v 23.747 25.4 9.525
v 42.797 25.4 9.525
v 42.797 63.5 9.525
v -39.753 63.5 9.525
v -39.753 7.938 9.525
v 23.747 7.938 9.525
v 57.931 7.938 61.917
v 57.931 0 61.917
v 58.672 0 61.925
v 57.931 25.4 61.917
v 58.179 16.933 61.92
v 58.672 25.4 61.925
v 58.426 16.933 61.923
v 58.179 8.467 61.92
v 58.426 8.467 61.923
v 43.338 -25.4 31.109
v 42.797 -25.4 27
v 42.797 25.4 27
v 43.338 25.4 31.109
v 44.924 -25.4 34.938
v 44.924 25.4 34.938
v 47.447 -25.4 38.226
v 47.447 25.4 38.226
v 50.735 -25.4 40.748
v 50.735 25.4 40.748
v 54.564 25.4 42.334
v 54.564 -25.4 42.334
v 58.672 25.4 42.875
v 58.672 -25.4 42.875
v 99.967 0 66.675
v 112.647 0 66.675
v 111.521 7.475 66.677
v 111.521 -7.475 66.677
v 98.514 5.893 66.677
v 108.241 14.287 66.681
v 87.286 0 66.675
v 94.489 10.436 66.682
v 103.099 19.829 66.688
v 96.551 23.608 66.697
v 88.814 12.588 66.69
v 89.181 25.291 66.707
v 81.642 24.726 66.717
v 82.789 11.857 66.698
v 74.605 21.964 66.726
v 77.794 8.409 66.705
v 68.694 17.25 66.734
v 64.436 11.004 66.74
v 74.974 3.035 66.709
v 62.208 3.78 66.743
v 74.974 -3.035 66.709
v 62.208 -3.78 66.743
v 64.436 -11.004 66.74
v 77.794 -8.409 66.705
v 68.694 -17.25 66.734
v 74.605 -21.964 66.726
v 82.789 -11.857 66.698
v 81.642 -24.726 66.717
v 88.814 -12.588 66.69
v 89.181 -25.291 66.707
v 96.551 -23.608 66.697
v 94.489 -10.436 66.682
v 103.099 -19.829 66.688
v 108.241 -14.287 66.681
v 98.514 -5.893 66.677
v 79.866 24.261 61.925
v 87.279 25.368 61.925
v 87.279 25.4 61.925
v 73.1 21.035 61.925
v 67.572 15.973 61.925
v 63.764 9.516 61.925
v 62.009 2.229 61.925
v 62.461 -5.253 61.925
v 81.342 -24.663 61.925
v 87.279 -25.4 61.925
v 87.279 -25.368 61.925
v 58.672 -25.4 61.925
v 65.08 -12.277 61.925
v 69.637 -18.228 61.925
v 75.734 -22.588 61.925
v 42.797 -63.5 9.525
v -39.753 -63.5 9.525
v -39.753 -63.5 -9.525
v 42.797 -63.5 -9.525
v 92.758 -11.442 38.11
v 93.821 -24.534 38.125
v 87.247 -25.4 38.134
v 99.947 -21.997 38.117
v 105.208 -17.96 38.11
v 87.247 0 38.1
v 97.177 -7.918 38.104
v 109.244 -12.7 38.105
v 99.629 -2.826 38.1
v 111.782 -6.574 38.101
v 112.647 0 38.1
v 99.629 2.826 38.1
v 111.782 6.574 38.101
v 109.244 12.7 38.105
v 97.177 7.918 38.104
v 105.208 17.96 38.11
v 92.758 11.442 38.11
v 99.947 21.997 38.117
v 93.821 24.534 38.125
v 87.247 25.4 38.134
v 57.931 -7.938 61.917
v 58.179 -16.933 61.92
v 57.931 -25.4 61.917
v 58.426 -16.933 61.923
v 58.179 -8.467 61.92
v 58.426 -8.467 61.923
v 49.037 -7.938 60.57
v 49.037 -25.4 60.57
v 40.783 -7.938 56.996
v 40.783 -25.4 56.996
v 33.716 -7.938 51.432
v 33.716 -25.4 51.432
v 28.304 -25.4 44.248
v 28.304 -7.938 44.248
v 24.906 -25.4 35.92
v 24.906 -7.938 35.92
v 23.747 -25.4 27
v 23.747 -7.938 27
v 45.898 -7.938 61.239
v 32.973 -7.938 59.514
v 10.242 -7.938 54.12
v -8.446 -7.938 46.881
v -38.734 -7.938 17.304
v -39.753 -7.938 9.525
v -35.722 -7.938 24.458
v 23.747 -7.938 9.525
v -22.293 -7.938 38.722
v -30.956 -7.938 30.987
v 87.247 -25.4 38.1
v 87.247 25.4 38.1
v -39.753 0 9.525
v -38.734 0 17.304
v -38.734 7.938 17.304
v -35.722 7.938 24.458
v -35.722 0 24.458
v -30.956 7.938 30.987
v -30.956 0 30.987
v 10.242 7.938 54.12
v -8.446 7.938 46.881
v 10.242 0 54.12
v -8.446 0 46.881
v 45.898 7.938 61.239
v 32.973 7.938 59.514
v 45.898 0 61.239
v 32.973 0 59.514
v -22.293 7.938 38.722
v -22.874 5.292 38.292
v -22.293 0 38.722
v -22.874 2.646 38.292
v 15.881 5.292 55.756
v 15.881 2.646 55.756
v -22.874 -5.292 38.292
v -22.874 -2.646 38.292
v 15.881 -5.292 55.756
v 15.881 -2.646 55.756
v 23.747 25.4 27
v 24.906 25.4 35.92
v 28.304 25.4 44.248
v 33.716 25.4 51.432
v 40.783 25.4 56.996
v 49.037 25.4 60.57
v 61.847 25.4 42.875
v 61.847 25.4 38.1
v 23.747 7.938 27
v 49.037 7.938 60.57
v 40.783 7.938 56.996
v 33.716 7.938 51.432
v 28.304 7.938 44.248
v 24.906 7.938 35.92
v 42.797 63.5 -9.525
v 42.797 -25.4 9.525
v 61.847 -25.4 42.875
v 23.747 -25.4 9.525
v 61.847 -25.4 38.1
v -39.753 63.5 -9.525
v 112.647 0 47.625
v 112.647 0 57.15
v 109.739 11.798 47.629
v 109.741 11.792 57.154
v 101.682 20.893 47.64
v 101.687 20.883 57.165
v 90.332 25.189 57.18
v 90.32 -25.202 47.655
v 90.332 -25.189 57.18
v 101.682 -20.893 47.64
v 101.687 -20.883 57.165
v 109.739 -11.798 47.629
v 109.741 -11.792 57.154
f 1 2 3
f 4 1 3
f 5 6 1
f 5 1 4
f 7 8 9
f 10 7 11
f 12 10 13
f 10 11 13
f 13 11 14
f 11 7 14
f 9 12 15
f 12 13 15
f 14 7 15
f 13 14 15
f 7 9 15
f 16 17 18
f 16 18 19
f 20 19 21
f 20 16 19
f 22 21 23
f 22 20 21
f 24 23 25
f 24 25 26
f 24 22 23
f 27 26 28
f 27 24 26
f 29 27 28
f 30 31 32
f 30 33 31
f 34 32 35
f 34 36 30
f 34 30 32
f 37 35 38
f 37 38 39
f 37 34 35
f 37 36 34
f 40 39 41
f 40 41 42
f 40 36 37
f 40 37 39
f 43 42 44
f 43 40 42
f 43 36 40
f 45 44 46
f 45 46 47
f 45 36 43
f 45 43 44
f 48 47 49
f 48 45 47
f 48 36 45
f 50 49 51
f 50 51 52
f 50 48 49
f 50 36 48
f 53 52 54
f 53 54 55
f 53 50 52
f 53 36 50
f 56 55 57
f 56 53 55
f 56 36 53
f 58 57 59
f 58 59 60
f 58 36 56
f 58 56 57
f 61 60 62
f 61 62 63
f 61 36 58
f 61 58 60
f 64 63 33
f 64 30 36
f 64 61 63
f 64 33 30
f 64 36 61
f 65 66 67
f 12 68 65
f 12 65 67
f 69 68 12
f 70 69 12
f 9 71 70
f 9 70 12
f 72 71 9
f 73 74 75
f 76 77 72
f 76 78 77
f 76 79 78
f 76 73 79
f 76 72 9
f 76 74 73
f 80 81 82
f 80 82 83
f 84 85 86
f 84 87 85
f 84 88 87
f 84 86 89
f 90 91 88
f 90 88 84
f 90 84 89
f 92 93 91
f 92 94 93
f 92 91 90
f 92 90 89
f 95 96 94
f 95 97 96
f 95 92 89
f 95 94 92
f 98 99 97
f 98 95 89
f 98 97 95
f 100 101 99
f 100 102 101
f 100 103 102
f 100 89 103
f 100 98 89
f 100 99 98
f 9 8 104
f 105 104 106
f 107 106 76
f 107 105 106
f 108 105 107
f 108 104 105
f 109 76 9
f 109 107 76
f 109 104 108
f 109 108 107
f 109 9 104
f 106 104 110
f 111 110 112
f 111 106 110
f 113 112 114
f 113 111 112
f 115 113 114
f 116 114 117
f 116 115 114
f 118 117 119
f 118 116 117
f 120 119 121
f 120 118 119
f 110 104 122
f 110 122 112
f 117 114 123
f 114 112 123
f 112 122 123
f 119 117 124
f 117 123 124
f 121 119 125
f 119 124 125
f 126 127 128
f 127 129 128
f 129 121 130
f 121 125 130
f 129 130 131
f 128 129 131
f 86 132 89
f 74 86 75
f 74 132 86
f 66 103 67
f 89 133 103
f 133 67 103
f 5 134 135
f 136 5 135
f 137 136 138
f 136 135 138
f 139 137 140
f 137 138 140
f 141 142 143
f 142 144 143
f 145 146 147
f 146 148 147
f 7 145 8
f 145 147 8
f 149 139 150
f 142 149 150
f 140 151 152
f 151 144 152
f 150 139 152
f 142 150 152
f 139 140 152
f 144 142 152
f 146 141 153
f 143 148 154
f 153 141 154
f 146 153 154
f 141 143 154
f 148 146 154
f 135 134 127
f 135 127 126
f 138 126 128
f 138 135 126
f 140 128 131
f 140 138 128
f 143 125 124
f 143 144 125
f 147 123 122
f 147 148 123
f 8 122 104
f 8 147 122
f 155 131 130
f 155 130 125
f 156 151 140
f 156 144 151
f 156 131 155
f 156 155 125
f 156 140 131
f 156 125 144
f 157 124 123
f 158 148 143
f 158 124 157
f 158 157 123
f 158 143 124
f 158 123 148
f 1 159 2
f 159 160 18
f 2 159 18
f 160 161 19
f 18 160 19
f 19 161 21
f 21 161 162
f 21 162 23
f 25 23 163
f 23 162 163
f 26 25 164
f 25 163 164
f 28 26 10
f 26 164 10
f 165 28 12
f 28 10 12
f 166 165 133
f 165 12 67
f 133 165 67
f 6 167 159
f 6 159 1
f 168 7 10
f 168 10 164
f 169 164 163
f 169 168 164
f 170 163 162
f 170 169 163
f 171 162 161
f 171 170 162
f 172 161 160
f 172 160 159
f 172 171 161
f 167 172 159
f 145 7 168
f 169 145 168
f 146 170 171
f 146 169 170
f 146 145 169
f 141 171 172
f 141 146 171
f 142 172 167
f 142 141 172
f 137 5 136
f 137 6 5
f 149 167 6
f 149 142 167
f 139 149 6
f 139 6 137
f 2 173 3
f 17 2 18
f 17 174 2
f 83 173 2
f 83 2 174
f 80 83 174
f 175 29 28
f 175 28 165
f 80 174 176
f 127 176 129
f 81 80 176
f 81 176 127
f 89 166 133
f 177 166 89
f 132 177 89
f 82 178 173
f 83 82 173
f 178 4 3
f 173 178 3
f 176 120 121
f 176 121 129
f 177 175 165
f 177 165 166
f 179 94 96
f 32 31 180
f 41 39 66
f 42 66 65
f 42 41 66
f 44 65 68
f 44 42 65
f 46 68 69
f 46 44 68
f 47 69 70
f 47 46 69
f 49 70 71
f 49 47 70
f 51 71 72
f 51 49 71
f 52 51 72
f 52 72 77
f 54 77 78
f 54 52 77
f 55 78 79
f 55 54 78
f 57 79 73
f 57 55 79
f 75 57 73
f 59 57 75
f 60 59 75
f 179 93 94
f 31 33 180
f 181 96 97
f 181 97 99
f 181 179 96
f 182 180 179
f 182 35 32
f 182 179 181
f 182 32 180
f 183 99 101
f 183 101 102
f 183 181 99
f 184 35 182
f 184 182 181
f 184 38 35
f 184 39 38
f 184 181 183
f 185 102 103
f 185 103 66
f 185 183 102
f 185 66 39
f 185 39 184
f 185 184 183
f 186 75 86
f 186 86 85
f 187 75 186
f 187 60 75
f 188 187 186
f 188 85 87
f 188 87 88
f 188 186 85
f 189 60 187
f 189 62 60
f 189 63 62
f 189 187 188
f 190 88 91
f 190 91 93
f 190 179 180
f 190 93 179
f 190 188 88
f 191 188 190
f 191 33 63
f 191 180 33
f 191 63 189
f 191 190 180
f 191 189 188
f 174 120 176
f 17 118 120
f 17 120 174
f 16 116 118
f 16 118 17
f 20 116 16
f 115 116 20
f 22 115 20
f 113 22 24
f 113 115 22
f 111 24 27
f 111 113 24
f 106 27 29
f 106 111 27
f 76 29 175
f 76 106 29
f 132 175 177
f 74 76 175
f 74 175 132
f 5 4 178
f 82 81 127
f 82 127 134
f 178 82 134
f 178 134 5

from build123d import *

# Parameters (mm, degrees)
F1_DEPTH = 63.5
F2_DEPTH = 25.4
F3_DEPTH = 25.4
F4_DEPTH = 7.9375


with BuildPart() as f1:
    # F0 (on Front) → F1 (new body, symmetric)
    with BuildSketch(Plane.XZ):
        Polygon((23.747439423, 9.525), (-39.752560577, 9.525), (-39.752560577, -9.525), (42.797439423, -9.525), (42.797439423, 9.525), align=None)
    extrude(amount=F1_DEPTH, both=True)

    # F0 (on Front) → F2 (join, symmetric)
    with BuildSketch(Plane.XZ):
        with BuildLine():
            Line((23.747439423, 27.0002), (23.747439423, 9.525))
            Line((23.747439423, 9.525), (42.797439423, 9.525))
            Line((42.797439423, 9.525), (42.797439423, 27.0002))
            ThreePointArc((42.797439423, 27.0002), (47.4471192717, 38.2255201513), (58.672439423, 42.8752))
            Line((58.672439423, 42.8752), (61.847439423, 42.8752))
            Line((61.847439423, 42.8752), (61.847439423, 61.9252))
            Line((61.847439423, 61.9252), (58.672439423, 61.9252))
            add(Edge.make_bspline(
                [(57.9305268727, 61.9173188784), (58.1788443539, 61.9206892677), (58.4261566277, 61.9233163085), (58.672439423, 61.9252)],
                knots=[110.7711022014, 110.7711022014, 110.7711022014, 110.7711022014, 111.5045361635, 111.5045361635, 111.5045361635, 111.5045361635], degree=3))
            ThreePointArc((57.9305268727, 61.9173188784), (33.7158078312, 51.4321905982), (23.747439423, 27.0002))
        make_face()
    extrude(amount=F2_DEPTH, both=True)

    # F0 (on Front) → F3 (join, symmetric)
    with BuildSketch(Plane.XZ):
        Polygon((87.2794313061, 61.9252), (61.847439423, 61.9252), (61.847439423, 42.8752), (61.847439423, 38.1), (87.247439423, 38.1), align=None)
    extrude(amount=F3_DEPTH, both=True)

    # F0 (on Front) → F4 (join, symmetric)
    with BuildSketch(Plane.XZ):
        with BuildLine():
            add(Edge.make_bspline(
                [(-39.752560577, 9.525), (-40.0057176122, 43.9432543149), (20.4269443953, 61.4082863569), (57.9305268727, 61.9173188784)],
                knots=[0, 0, 0, 0, 110.7711022014, 110.7711022014, 110.7711022014, 110.7711022014], degree=3))
            Line((-39.752560577, 9.525), (23.747439423, 9.525))
            Line((23.747439423, 9.525), (23.747439423, 27.0002))
            ThreePointArc((23.747439423, 27.0002), (33.7158078312, 51.4321905982), (57.9305268727, 61.9173188784))
        make_face()
    extrude(amount=F4_DEPTH, both=True)

    # F0 (on Front) → F5 (revolve)
    with BuildSketch(Plane.XZ):
        Polygon((87.2858092189, 66.675), (87.2794313061, 61.9252), (87.247439423, 38.1), (112.647439423, 38.1), (112.647439423, 66.675), align=None)
    revolve(axis=Axis((87.2666243209, 0, 52.3875), (0.0013427738, 0, 0.9999990985)))


solid = f1.part
